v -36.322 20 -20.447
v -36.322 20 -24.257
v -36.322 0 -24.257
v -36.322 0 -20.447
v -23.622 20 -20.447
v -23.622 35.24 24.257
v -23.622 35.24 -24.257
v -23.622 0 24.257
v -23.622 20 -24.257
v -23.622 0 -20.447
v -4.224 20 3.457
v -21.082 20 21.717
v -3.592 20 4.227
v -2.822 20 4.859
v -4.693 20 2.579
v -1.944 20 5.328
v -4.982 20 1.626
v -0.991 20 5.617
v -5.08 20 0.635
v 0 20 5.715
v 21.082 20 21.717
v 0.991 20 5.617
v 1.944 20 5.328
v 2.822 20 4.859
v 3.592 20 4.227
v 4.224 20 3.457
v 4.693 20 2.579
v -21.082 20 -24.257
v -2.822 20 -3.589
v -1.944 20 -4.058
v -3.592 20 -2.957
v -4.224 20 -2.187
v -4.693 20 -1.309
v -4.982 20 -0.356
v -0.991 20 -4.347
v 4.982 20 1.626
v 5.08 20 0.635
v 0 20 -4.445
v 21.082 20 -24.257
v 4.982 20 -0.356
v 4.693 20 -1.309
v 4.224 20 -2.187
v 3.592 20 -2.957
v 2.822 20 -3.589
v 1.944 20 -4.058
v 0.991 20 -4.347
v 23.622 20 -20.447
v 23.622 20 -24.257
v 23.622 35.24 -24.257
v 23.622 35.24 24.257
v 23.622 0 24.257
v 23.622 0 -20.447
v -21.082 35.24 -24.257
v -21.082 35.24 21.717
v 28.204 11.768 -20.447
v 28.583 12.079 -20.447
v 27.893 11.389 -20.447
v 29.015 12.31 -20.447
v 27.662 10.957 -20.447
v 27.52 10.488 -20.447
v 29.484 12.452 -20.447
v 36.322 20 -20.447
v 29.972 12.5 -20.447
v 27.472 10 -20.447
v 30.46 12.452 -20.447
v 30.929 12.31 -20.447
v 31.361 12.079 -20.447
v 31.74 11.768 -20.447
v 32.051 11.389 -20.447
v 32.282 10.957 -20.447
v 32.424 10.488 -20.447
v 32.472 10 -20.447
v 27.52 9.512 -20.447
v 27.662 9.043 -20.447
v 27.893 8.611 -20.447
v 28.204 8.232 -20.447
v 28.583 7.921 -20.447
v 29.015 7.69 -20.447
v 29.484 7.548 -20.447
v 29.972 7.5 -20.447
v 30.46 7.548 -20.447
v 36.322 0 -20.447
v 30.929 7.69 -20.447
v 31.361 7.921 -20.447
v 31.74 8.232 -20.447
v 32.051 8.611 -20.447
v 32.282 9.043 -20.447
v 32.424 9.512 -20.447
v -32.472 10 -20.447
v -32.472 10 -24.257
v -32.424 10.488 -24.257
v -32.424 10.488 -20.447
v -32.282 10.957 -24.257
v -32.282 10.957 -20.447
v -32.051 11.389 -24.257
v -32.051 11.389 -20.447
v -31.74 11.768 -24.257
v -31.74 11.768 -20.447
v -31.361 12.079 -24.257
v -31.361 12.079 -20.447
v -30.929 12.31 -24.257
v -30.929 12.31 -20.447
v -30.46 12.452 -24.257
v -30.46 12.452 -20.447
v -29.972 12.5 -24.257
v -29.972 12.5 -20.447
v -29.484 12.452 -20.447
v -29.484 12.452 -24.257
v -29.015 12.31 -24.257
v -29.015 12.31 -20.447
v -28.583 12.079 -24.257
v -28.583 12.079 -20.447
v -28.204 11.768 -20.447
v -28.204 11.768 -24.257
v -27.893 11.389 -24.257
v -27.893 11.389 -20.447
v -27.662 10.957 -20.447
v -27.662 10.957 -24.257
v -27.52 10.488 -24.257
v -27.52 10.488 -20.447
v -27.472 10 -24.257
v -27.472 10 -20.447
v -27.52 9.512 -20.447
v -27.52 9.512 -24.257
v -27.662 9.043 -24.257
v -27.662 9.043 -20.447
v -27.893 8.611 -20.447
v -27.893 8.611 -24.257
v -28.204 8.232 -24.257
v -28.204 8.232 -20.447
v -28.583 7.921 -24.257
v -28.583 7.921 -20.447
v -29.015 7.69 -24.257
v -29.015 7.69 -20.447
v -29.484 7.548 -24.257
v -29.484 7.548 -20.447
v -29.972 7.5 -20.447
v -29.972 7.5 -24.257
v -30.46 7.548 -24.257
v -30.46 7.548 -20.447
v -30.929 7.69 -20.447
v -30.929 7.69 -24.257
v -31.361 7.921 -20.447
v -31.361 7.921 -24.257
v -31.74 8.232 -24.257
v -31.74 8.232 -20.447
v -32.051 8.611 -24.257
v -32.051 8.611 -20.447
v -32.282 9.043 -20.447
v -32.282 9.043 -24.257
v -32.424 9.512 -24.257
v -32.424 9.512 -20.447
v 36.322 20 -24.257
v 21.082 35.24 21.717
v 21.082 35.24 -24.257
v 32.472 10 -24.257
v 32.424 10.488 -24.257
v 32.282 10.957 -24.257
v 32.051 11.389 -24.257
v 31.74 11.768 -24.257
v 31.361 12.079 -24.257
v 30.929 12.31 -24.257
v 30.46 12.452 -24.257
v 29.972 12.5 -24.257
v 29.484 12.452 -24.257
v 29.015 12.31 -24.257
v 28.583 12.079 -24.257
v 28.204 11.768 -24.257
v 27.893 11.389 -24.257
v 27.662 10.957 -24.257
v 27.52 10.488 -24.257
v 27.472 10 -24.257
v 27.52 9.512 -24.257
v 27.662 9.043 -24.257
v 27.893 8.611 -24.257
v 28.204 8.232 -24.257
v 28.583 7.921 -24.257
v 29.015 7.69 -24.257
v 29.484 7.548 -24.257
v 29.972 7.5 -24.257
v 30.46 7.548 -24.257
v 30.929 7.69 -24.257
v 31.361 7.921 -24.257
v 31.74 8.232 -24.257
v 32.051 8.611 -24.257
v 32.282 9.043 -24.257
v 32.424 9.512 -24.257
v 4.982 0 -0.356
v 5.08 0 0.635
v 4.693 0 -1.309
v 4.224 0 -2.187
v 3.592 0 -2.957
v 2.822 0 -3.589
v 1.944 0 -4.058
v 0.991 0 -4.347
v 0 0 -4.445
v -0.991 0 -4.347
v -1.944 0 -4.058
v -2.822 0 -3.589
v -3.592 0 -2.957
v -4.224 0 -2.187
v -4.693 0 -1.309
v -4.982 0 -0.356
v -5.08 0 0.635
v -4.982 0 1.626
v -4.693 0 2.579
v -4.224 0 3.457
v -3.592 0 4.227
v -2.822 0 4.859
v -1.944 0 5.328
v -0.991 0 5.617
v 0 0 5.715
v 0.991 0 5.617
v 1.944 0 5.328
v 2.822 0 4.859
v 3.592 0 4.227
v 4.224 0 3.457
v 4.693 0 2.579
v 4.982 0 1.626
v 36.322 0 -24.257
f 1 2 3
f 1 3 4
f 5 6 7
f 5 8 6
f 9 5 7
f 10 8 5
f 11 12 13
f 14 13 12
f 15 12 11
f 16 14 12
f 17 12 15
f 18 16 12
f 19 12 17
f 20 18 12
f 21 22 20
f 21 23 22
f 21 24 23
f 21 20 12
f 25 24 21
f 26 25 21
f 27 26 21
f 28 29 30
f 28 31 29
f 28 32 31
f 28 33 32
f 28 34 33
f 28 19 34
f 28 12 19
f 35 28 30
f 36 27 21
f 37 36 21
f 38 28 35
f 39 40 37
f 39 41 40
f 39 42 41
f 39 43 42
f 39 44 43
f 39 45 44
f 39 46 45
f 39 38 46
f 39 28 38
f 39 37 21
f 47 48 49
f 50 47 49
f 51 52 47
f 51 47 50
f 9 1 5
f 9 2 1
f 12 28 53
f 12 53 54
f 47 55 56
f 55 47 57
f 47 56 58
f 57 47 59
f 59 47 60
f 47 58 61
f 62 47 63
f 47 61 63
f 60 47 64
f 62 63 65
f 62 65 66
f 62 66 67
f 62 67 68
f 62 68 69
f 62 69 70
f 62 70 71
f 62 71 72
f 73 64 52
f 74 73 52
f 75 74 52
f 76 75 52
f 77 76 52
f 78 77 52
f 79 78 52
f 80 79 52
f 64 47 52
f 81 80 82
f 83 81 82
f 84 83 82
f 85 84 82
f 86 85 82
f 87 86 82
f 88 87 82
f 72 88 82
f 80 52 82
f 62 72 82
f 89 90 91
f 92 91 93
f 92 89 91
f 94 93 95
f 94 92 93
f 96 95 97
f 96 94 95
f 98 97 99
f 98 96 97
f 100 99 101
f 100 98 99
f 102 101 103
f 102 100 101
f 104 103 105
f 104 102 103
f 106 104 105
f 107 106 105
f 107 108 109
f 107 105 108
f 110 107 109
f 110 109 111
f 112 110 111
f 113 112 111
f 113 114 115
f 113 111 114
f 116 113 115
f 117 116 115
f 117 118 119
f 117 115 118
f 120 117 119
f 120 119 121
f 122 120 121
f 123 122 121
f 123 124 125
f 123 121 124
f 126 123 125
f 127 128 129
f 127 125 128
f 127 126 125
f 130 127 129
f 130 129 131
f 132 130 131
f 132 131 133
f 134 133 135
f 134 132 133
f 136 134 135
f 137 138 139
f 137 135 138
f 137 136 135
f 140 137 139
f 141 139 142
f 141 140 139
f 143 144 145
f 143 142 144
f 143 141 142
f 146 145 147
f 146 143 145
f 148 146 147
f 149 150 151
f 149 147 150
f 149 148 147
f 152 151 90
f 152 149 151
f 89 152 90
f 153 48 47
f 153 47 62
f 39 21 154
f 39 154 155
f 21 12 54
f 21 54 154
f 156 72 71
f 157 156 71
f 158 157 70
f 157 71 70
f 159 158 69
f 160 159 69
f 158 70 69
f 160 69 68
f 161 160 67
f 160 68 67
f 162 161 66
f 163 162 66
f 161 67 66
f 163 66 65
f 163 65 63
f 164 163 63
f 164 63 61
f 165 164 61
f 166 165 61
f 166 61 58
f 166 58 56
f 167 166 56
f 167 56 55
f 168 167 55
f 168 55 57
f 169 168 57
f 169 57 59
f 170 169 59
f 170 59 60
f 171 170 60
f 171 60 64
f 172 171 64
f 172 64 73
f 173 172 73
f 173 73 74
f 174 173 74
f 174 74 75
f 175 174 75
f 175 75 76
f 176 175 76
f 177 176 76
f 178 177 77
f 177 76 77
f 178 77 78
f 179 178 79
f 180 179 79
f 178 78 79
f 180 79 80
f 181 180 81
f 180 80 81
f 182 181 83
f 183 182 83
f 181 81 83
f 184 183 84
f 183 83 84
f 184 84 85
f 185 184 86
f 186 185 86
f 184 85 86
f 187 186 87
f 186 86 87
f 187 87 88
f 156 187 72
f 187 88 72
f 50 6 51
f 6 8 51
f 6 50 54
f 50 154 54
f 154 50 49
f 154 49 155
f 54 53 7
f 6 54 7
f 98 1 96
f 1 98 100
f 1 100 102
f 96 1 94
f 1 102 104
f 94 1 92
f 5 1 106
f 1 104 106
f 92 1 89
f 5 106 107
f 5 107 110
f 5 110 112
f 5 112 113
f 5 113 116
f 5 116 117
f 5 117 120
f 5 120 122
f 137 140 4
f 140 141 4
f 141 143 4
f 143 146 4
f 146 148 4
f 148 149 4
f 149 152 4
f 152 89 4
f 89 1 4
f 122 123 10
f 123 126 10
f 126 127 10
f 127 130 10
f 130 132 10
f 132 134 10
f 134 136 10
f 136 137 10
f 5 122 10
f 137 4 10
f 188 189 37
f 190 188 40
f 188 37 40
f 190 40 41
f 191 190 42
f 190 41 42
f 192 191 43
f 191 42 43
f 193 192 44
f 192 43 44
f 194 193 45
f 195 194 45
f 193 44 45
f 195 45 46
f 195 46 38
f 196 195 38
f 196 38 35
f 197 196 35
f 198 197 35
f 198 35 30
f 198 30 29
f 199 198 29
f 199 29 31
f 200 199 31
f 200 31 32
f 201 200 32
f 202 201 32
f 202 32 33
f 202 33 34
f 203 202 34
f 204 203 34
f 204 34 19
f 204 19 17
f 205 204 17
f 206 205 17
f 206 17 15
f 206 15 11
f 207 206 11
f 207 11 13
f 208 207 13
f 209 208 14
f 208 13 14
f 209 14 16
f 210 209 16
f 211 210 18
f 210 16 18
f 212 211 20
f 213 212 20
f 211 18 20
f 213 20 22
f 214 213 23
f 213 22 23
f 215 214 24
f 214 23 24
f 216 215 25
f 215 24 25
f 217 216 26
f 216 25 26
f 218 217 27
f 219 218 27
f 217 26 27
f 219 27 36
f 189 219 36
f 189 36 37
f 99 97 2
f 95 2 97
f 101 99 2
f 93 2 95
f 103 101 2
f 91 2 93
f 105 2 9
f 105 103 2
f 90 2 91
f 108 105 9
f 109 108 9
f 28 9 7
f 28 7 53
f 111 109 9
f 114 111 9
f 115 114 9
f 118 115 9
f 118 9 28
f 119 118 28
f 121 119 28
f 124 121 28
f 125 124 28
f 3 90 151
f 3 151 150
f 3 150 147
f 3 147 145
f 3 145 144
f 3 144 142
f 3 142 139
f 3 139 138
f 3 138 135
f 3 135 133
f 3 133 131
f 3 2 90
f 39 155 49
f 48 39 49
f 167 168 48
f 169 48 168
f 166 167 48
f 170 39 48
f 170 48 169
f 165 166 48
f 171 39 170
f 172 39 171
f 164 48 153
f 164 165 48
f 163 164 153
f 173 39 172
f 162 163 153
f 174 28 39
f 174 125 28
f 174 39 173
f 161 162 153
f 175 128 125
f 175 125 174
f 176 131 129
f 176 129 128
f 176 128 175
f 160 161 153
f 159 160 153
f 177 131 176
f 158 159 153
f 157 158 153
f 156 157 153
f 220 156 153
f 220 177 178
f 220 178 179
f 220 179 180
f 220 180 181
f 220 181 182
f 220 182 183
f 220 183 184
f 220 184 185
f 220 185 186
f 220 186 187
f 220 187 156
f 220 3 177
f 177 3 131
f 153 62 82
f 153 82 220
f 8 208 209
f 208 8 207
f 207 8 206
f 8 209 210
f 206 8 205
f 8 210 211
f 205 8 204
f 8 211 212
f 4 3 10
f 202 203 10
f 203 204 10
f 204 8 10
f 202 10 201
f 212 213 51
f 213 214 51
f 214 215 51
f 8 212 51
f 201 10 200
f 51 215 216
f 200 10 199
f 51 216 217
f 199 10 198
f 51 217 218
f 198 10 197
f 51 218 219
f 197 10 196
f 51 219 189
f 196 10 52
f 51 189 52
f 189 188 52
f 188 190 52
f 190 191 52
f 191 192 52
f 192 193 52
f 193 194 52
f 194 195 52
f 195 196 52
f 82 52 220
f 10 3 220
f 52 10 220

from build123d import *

# Parameters (mm, degrees)
BOSS_EXTRUDE1_DEPTH = 20
BOSS_EXTRUDE2_DEPTH = 15.24
SKETCH3_R           = 2.5
CUT_EXTRUDE1_DEPTH  = 4.81
SKETCH4_R           = 5.08
CUT_EXTRUDE2_DEPTH  = 21


with BuildPart() as part:
    # Sketch1 → Boss-Extrude1 (new body)
    with BuildSketch(Plane(origin=(0, 0, 0), x_dir=(1, 0, 0), z_dir=(0, 1, 0))):
        Polygon((-23.622, -24.257), (23.622, -24.257), (23.622, 20.447), (36.322, 20.447), (36.322, 24.257), (23.622, 24.257), (-23.622, 24.257), (-36.322, 24.257), (-36.322, 20.447), (-23.622, 20.447), align=None)
    extrude(amount=BOSS_EXTRUDE1_DEPTH)

    # Sketch2 → Boss-Extrude2 (add)
    with BuildSketch(Plane(origin=(0, 20, 0), x_dir=(1, 0, 0), z_dir=(0, 1, 0))):
        Polygon((-23.622, 24.257), (-21.082, 24.257), (-21.082, -21.717), (21.082, -21.717), (21.082, 24.257), (23.622, 24.257), (23.622, -24.257), (-21.668534476, -24.257), (-23.622, -24.257), align=None)
    extrude(amount=BOSS_EXTRUDE2_DEPTH)

    # Sketch3 → Cut-Extrude1 (cut, through all)
    with BuildSketch(Plane.XY.offset(-20.447)):
        with Locations((29.972, 10)):
            Circle(SKETCH3_R)
    cut_extrude1 = extrude(amount=-CUT_EXTRUDE1_DEPTH, mode=Mode.SUBTRACT)

    # Mirror1: Cut-Extrude1 across plane
    add(cut_extrude1.mirror(Plane(origin=(0, 0, 0), x_dir=(0, 0, 1), z_dir=(1, 0, 0))), mode=Mode.SUBTRACT)

    # Sketch4 → Cut-Extrude2 (cut, through all)
    with BuildSketch(Plane(origin=(0, 20, 0), x_dir=(1, 0, 0), z_dir=(0, 1, 0))):
        with Locations((0, -0.635)):
            Circle(SKETCH4_R)
    extrude(amount=-CUT_EXTRUDE2_DEPTH, mode=Mode.SUBTRACT)


solid = part.part
